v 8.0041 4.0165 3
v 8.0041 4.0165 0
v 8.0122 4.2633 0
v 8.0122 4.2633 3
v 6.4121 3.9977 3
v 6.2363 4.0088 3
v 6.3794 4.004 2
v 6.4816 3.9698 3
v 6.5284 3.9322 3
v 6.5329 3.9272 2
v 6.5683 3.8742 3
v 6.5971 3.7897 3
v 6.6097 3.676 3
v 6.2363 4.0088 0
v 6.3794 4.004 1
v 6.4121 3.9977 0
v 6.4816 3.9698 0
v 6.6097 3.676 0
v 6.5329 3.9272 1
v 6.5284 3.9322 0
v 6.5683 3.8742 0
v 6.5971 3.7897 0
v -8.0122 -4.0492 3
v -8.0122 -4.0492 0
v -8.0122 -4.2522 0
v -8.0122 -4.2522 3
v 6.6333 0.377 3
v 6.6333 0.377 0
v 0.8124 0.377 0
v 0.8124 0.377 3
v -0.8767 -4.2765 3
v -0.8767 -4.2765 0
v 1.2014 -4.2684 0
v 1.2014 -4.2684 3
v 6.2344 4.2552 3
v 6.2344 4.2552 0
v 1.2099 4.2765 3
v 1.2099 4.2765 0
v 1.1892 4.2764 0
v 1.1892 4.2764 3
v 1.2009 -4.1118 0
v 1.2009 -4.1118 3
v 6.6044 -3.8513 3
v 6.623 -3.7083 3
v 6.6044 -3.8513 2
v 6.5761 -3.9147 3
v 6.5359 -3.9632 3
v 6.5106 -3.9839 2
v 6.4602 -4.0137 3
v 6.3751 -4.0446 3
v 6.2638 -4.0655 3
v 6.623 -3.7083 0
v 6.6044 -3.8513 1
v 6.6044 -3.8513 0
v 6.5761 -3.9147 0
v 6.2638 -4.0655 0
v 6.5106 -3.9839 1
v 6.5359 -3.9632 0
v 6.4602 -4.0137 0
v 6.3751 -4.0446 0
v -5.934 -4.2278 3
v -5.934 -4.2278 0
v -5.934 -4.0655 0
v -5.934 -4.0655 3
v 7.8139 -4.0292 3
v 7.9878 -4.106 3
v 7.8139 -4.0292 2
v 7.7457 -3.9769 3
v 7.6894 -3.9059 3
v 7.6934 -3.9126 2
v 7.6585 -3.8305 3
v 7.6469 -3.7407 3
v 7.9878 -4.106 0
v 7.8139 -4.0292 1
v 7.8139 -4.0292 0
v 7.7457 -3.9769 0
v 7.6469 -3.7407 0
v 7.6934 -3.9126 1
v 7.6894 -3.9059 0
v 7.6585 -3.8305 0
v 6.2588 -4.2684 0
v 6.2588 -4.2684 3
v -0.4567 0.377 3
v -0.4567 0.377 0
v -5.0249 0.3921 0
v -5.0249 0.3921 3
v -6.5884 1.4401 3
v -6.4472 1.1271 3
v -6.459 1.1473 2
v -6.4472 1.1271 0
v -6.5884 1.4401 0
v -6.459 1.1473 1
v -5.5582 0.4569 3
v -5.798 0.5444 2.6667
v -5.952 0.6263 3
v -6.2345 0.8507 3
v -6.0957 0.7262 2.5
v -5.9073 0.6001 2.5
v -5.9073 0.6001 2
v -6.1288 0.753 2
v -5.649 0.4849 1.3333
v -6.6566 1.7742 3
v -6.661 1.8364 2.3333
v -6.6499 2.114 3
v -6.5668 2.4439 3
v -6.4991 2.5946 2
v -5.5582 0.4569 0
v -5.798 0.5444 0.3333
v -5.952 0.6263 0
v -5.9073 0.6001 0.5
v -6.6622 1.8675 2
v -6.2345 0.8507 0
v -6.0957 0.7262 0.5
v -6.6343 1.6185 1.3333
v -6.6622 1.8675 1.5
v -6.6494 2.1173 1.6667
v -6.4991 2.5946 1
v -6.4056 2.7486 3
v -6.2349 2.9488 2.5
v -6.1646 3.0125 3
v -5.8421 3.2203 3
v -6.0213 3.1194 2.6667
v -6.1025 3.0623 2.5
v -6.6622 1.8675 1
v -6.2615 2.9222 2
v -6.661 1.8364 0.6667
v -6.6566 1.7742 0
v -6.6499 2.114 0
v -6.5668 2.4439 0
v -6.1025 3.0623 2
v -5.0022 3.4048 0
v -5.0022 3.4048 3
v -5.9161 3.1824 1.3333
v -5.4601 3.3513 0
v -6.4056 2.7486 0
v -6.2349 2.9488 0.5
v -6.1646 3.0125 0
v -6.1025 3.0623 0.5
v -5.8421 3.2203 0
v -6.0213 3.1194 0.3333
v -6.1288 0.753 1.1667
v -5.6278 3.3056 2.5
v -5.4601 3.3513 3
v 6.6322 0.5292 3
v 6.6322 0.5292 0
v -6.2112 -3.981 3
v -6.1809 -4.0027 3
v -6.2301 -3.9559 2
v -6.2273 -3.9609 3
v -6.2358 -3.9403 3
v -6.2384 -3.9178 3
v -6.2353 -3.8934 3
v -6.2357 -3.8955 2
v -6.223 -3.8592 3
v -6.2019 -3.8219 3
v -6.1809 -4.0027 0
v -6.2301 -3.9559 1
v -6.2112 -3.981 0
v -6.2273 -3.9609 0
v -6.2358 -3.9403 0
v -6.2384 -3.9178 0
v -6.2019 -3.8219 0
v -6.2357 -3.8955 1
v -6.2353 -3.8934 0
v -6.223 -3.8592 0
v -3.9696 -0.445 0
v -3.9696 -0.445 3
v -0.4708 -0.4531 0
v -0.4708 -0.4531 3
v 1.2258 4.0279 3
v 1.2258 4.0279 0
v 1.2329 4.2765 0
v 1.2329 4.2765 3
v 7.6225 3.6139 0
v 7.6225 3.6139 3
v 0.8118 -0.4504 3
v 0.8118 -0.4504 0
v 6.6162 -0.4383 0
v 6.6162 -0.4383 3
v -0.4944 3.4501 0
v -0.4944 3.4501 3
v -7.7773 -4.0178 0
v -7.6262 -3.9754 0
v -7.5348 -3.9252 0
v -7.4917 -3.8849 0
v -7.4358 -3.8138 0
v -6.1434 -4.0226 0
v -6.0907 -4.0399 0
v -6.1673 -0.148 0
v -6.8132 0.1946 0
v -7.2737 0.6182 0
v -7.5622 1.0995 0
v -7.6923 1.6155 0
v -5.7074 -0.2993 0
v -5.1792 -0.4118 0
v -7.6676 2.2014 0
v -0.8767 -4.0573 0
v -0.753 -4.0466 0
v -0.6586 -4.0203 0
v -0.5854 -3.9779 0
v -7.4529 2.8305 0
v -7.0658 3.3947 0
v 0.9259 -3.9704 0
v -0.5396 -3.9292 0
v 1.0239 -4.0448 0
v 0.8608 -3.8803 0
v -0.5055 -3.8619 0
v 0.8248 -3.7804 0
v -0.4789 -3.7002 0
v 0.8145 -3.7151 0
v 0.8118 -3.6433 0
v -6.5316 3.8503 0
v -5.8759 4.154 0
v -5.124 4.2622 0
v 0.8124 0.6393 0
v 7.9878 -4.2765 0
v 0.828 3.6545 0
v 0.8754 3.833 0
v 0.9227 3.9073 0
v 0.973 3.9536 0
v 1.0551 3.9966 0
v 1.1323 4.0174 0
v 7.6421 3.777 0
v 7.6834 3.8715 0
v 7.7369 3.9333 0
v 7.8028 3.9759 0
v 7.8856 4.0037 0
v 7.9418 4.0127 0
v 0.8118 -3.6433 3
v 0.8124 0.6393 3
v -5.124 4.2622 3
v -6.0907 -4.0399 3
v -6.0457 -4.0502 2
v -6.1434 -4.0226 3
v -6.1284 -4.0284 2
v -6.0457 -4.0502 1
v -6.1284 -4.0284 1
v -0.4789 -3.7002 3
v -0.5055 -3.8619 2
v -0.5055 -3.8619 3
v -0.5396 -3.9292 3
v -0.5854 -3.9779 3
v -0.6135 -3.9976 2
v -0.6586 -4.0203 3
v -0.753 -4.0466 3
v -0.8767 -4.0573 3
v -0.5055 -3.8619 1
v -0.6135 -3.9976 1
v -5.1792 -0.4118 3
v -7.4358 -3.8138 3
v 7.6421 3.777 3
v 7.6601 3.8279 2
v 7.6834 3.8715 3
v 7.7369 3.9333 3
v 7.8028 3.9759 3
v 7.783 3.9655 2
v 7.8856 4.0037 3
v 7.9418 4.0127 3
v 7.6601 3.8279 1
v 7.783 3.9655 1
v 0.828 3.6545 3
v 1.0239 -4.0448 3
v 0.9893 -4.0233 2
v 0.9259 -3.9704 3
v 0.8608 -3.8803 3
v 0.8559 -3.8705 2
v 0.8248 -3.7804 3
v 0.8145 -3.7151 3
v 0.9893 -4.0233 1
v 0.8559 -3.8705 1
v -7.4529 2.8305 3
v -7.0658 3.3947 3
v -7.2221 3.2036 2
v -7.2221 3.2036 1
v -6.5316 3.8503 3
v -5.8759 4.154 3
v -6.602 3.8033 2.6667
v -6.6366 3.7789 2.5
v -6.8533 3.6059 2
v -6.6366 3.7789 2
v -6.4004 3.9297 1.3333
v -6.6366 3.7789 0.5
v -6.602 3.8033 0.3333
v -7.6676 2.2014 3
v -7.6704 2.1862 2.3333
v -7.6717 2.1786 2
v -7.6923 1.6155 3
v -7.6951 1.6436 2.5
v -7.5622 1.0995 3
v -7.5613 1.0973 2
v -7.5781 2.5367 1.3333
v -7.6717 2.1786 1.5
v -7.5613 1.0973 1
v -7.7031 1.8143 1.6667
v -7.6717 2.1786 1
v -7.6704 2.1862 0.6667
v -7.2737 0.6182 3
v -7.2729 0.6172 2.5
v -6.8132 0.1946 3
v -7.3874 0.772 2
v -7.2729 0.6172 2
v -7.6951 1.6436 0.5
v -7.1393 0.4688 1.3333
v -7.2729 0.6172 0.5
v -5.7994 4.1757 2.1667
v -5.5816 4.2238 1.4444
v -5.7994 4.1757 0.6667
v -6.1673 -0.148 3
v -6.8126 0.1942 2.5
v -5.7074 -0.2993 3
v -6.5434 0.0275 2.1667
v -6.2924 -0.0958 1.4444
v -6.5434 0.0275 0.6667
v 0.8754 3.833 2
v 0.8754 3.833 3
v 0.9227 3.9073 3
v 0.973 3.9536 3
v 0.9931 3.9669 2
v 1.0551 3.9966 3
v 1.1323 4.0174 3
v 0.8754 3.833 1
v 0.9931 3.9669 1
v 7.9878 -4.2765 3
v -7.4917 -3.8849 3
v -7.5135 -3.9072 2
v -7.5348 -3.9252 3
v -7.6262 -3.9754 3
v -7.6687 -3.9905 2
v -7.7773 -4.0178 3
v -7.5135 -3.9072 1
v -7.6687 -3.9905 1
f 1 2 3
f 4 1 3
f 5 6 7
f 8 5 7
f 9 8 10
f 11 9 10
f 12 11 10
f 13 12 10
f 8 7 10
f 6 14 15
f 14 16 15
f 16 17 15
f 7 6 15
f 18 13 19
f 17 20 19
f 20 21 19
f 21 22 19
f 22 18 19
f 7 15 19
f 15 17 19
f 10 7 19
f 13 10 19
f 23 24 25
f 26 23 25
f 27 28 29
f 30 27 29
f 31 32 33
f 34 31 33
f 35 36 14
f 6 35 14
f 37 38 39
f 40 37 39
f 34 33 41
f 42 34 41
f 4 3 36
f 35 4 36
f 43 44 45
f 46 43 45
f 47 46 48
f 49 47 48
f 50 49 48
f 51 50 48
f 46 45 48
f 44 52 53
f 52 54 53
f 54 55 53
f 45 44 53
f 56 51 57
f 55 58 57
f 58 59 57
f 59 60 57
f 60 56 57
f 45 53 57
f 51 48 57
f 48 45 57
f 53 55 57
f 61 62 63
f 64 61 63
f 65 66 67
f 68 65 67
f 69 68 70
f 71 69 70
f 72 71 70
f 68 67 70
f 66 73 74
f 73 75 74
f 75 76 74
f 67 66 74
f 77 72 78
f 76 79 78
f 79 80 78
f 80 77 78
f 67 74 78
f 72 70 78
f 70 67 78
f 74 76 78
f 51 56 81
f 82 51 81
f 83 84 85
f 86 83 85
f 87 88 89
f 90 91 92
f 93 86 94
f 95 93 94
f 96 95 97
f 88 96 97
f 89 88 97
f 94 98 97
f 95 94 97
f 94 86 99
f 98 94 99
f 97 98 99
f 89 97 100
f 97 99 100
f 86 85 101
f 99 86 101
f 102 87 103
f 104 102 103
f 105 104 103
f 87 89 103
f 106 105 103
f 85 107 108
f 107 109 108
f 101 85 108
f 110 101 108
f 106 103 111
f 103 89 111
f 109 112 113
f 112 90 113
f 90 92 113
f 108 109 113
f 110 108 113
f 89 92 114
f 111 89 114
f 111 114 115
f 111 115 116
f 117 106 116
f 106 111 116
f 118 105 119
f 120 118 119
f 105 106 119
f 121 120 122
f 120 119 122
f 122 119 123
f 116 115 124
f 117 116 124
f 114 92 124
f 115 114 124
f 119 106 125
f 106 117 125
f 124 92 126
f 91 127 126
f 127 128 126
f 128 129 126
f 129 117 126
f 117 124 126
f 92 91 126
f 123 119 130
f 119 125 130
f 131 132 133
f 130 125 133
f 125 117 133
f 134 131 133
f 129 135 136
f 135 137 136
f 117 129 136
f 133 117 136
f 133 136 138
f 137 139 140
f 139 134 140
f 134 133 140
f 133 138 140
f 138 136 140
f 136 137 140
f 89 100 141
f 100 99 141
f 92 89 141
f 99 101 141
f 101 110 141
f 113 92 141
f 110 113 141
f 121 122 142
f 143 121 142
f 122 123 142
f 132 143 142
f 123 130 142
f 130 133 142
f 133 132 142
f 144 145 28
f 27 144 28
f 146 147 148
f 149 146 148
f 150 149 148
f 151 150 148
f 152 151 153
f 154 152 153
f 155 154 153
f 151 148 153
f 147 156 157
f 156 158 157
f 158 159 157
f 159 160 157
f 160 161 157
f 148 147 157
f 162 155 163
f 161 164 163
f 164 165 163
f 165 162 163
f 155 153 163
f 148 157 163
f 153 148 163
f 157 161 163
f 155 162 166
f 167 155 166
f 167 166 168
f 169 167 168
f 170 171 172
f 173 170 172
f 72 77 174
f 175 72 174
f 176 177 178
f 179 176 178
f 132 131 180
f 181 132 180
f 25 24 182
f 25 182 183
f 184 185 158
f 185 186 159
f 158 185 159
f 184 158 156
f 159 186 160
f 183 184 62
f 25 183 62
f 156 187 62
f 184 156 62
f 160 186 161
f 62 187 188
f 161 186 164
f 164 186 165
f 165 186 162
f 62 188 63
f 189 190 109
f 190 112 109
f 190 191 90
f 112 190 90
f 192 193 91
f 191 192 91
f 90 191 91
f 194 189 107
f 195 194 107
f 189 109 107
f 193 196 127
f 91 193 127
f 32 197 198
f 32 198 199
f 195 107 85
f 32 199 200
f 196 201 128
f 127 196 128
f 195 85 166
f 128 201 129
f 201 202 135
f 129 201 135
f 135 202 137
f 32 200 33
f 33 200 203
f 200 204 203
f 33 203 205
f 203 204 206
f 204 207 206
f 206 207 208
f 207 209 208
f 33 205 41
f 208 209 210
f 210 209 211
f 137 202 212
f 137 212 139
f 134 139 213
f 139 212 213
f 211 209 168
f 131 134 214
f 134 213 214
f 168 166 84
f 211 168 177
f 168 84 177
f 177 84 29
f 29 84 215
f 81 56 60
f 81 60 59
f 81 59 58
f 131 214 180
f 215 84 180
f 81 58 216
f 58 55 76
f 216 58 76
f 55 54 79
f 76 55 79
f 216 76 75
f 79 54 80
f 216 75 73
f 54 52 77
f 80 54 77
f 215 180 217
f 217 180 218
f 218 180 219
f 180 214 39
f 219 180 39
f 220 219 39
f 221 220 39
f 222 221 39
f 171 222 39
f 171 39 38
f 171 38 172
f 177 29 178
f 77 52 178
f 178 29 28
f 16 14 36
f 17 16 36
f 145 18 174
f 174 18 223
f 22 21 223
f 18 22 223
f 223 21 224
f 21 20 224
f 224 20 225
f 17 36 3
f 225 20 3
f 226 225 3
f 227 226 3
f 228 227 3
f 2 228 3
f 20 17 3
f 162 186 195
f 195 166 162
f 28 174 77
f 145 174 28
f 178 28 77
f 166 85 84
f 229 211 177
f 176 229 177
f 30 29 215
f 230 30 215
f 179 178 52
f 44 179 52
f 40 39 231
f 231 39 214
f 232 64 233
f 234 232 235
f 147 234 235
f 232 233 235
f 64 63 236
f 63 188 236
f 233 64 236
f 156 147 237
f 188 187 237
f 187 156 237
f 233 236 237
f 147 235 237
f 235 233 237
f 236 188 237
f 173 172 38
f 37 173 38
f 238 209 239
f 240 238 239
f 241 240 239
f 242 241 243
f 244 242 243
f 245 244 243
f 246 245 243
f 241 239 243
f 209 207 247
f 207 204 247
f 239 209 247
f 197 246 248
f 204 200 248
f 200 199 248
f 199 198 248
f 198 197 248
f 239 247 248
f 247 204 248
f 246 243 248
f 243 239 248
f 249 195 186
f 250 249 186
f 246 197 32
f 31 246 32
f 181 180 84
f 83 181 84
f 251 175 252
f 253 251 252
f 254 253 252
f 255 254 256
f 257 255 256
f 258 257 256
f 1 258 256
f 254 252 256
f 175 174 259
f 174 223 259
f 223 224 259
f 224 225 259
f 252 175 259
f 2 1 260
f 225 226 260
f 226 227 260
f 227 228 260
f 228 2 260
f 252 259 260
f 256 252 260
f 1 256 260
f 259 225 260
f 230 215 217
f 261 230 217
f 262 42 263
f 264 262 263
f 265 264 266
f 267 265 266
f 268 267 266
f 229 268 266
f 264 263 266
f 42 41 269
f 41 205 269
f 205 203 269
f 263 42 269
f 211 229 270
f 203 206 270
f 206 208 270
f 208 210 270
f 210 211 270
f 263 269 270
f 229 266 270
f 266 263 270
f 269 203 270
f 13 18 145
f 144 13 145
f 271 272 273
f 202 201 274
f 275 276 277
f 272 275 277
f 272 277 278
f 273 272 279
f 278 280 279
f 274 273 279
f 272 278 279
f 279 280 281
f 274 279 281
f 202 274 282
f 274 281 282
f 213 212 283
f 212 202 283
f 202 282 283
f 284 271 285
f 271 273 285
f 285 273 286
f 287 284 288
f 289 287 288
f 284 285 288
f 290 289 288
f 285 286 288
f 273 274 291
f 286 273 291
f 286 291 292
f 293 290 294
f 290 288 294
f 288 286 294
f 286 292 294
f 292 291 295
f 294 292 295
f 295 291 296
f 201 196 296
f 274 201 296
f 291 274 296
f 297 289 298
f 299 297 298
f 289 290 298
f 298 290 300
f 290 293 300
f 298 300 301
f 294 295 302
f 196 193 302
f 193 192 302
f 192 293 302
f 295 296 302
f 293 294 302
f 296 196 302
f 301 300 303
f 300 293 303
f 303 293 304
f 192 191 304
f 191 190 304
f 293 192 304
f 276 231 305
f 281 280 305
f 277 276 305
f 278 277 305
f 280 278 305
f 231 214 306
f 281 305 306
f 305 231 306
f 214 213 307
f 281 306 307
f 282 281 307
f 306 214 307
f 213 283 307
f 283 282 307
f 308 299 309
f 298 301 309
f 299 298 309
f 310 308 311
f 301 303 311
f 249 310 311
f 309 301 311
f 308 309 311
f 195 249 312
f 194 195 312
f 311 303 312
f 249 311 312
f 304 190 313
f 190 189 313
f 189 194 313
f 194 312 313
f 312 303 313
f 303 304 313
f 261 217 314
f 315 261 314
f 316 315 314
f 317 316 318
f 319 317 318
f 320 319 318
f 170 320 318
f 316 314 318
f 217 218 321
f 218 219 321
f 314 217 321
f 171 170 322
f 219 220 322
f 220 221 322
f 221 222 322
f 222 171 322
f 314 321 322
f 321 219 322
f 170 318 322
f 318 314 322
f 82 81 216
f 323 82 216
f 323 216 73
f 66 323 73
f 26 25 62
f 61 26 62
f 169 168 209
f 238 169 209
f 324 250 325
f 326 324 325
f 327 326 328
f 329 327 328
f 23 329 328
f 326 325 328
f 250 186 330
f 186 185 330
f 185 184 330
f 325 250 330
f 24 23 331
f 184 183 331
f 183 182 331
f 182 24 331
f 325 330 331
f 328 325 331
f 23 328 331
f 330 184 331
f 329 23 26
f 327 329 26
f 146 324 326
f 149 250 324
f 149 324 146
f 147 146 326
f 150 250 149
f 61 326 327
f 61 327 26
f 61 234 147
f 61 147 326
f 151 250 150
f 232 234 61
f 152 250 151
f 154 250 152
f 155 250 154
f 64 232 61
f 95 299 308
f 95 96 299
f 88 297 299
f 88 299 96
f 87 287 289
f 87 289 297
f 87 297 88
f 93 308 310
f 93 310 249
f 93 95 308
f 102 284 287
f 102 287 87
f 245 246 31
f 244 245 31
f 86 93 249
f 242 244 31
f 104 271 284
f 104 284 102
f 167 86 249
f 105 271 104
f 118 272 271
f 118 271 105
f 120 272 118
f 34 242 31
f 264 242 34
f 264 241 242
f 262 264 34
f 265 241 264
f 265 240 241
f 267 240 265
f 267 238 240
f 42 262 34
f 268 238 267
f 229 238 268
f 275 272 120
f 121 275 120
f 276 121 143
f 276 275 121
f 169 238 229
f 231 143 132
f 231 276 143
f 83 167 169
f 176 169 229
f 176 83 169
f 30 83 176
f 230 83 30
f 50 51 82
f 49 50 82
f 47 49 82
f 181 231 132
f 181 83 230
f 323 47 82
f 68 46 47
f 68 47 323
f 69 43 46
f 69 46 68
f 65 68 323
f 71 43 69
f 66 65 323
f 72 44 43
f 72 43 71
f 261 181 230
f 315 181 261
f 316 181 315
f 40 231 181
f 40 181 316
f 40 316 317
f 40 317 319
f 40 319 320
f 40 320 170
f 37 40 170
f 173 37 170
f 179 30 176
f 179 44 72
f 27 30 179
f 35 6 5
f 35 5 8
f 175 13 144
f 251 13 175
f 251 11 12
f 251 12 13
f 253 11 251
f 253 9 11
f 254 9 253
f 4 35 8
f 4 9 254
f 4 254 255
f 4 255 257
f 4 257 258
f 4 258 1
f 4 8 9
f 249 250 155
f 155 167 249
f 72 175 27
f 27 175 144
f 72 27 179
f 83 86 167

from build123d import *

# Parameters (mm, degrees)
F1_DEPTH = 3


# Not quite as in the source:
# - ends of sketch curves that miss each other by under 0.0002 mm in the source are joined


with BuildPart() as f1:
    # F0 (on Top) → F1 (new body)
    with BuildSketch(Plane.XY):
        with BuildLine():
            Line((1.1892447866, 4.276448), (-5.1239697534, 4.2621811105))
            add(Edge.make_bspline(
                [(-5.1239697534, 4.2621811105), (-7.7808246997, 4.2757478261), (-9.2426975653, 0.2504639081), (-5.1792210147, -0.4118392886)],
                knots=[0, 0, 0, 0, 1, 1, 1, 1], degree=3))
            Line((-5.1792210147, -0.4118392886), (-7.4358199708, -3.8138012247))
            add(Edge.make_bspline(
                [(-7.4358199708, -3.8138012247), (-7.5115597505, -3.9074856806), (-7.537762832, -4.0076449282), (-8.0121770072, -4.0492147307)],
                knots=[0, 0, 0, 0, 1, 1, 1, 1], degree=3))
            Line((-8.0121770072, -4.0492147307), (-8.0121770072, -4.2521576986))
            Line((-8.0121770072, -4.2521576986), (-5.9340439579, -4.2278042412))
            Line((-5.9340439579, -4.2278042412), (-5.9340439579, -4.0654502213))
            add(Edge.make_bspline(
                [(-5.9340439579, -4.0654502213), (-6.0599730098, -4.054522155), (-6.1436827864, -4.0293012572), (-6.1809375378, -4.0026613543)],
                knots=[0, 0, 0, 0, 1, 1, 1, 1], degree=3))
            add(Edge.make_bspline(
                [(-6.1809375378, -4.0026613543), (-6.2530914835, -3.9629456061), (-6.2541383485, -3.9018136478), (-6.2019284451, -3.8219191915)],
                knots=[0, 0, 0, 0, 1, 1, 1, 1], degree=3))
            Line((-6.2019284451, -3.8219191915), (-3.9695588998, -0.4449526542))
            Line((-3.9695588998, -0.4449526542), (-0.4708268475, -0.453070178))
            Line((-0.4708268475, -0.453070178), (-0.4789443713, -3.7001536766))
            add(Edge.make_bspline(
                [(-0.4789443713, -3.7001536766), (-0.4894063767, -3.8582816931), (-0.511182765, -4.0522109002), (-0.8767118972, -4.0573326976)],
                knots=[0, 0, 0, 0, 1, 1, 1, 1], degree=3))
            Line((-0.8767118972, -4.0573326976), (-0.8767118972, -4.276510713))
            Line((-0.8767118972, -4.276510713), (1.2014211521, -4.2683931892))
            Line((1.2014211521, -4.2683931892), (1.2009267376, -4.1117789848))
            add(Edge.make_bspline(
                [(1.2009267376, -4.1117789848), (0.9540548658, -4.0521630537), (0.8074211, -3.9109443668), (0.8117693779, -3.643329238)],
                knots=[0, 0, 0, 0, 1, 1, 1, 1], degree=3))
            Line((0.8117693779, -3.643329238), (0.8117693779, -0.4504044473))
            Line((0.8117693779, -0.4504044473), (6.6162368382, -0.4383405203))
            Line((6.6162368382, -0.4383405203), (6.623033018, -3.7082712004))
            add(Edge.make_bspline(
                [(6.623033018, -3.7082712004), (6.6159065383, -3.8428631383), (6.6131664366, -4.0230470912), (6.2638249484, -4.0654502213)],
                knots=[0, 0, 0, 0, 1, 1, 1, 1], degree=3))
            Line((6.2638249484, -4.0654502213), (6.2587514407, -4.2683931892))
            Line((6.2587514407, -4.2683931892), (7.9878229928, -4.276510713))
            Line((7.9878229928, -4.276510713), (7.9878229928, -4.1060387263))
            add(Edge.make_bspline(
                [(7.9878229928, -4.1060387263), (7.7941463093, -4.0440123031), (7.6495123525, -3.9453779431), (7.6468790194, -3.7407417386)],
                knots=[0, 0, 0, 0, 1, 1, 1, 1], degree=3))
            Line((7.6468790194, -3.7407417386), (7.6225260051, 3.6139009438))
            add(Edge.make_bspline(
                [(7.6225260051, 3.6139009438), (7.6218814055, 3.8627278793), (7.729467946, 4.0122785134), (8.0040584834, 4.0164664167)],
                knots=[0, 0, 0, 0, 1, 1, 1, 1], degree=3))
            Line((8.0040584834, 4.0164664167), (8.0121760072, 4.2633179094))
            Line((8.0121760072, 4.2633179094), (6.2343979833, 4.2551999426))
            Line((6.2343979833, 4.2551999426), (6.2363273516, 4.008799005))
            add(Edge.make_bspline(
                [(6.2363273516, 4.008799005), (6.3452247993, 4.0058905543), (6.6002611554, 4.0485187405), (6.6097418632, 3.6759729985)],
                knots=[0, 0, 0, 0, 1, 1, 1, 1], degree=3))
            Line((6.6097418632, 3.6759729985), (6.6321672813, 0.5291723511))
            Line((6.6321672813, 0.5291723511), (6.6332519216, 0.3769724351))
            Line((6.6332519216, 0.3769724351), (0.8123838086, 0.3769724351))
            Line((0.8123838086, 0.3769724351), (0.8123838086, 0.6393006265))
            Line((0.8123838086, 0.6393006265), (0.8280061975, 3.6544898918))
            add(Edge.make_bspline(
                [(0.8280061975, 3.6544898918), (0.8551715265, 3.8458646241), (0.9207173302, 4.0128832408), (1.2257741664, 4.0279044033)],
                knots=[0, 0, 0, 0, 1, 1, 1, 1], degree=3))
            Line((1.2257741664, 4.0279044033), (1.2328771659, 4.2765093839))
            Line((1.2328771659, 4.2765093839), (1.2099382837, 4.2765100827))
            Line((1.2099382837, 4.2765100827), (1.1892447866, 4.276448))
        make_face()
        with BuildLine():
            Line((-0.456683315, 0.3769724351), (-5.024860472, 0.3920733419))
            add(Edge.make_bspline(
                [(-5.024860472, 0.3920733419), (-7.1084099294, 0.3583060733), (-7.3152098618, 3.3560575894), (-5.0022086687, 3.4048052624)],
                knots=[0, 0, 0, 0, 1, 1, 1, 1], degree=3))
            Line((-5.0022086687, 3.4048052624), (-0.4944369111, 3.450109312))
            Line((-0.4944369111, 3.450109312), (-0.456683315, 0.3769724351))
        make_face(mode=Mode.SUBTRACT)
    extrude(amount=F1_DEPTH)


solid = f1.part
